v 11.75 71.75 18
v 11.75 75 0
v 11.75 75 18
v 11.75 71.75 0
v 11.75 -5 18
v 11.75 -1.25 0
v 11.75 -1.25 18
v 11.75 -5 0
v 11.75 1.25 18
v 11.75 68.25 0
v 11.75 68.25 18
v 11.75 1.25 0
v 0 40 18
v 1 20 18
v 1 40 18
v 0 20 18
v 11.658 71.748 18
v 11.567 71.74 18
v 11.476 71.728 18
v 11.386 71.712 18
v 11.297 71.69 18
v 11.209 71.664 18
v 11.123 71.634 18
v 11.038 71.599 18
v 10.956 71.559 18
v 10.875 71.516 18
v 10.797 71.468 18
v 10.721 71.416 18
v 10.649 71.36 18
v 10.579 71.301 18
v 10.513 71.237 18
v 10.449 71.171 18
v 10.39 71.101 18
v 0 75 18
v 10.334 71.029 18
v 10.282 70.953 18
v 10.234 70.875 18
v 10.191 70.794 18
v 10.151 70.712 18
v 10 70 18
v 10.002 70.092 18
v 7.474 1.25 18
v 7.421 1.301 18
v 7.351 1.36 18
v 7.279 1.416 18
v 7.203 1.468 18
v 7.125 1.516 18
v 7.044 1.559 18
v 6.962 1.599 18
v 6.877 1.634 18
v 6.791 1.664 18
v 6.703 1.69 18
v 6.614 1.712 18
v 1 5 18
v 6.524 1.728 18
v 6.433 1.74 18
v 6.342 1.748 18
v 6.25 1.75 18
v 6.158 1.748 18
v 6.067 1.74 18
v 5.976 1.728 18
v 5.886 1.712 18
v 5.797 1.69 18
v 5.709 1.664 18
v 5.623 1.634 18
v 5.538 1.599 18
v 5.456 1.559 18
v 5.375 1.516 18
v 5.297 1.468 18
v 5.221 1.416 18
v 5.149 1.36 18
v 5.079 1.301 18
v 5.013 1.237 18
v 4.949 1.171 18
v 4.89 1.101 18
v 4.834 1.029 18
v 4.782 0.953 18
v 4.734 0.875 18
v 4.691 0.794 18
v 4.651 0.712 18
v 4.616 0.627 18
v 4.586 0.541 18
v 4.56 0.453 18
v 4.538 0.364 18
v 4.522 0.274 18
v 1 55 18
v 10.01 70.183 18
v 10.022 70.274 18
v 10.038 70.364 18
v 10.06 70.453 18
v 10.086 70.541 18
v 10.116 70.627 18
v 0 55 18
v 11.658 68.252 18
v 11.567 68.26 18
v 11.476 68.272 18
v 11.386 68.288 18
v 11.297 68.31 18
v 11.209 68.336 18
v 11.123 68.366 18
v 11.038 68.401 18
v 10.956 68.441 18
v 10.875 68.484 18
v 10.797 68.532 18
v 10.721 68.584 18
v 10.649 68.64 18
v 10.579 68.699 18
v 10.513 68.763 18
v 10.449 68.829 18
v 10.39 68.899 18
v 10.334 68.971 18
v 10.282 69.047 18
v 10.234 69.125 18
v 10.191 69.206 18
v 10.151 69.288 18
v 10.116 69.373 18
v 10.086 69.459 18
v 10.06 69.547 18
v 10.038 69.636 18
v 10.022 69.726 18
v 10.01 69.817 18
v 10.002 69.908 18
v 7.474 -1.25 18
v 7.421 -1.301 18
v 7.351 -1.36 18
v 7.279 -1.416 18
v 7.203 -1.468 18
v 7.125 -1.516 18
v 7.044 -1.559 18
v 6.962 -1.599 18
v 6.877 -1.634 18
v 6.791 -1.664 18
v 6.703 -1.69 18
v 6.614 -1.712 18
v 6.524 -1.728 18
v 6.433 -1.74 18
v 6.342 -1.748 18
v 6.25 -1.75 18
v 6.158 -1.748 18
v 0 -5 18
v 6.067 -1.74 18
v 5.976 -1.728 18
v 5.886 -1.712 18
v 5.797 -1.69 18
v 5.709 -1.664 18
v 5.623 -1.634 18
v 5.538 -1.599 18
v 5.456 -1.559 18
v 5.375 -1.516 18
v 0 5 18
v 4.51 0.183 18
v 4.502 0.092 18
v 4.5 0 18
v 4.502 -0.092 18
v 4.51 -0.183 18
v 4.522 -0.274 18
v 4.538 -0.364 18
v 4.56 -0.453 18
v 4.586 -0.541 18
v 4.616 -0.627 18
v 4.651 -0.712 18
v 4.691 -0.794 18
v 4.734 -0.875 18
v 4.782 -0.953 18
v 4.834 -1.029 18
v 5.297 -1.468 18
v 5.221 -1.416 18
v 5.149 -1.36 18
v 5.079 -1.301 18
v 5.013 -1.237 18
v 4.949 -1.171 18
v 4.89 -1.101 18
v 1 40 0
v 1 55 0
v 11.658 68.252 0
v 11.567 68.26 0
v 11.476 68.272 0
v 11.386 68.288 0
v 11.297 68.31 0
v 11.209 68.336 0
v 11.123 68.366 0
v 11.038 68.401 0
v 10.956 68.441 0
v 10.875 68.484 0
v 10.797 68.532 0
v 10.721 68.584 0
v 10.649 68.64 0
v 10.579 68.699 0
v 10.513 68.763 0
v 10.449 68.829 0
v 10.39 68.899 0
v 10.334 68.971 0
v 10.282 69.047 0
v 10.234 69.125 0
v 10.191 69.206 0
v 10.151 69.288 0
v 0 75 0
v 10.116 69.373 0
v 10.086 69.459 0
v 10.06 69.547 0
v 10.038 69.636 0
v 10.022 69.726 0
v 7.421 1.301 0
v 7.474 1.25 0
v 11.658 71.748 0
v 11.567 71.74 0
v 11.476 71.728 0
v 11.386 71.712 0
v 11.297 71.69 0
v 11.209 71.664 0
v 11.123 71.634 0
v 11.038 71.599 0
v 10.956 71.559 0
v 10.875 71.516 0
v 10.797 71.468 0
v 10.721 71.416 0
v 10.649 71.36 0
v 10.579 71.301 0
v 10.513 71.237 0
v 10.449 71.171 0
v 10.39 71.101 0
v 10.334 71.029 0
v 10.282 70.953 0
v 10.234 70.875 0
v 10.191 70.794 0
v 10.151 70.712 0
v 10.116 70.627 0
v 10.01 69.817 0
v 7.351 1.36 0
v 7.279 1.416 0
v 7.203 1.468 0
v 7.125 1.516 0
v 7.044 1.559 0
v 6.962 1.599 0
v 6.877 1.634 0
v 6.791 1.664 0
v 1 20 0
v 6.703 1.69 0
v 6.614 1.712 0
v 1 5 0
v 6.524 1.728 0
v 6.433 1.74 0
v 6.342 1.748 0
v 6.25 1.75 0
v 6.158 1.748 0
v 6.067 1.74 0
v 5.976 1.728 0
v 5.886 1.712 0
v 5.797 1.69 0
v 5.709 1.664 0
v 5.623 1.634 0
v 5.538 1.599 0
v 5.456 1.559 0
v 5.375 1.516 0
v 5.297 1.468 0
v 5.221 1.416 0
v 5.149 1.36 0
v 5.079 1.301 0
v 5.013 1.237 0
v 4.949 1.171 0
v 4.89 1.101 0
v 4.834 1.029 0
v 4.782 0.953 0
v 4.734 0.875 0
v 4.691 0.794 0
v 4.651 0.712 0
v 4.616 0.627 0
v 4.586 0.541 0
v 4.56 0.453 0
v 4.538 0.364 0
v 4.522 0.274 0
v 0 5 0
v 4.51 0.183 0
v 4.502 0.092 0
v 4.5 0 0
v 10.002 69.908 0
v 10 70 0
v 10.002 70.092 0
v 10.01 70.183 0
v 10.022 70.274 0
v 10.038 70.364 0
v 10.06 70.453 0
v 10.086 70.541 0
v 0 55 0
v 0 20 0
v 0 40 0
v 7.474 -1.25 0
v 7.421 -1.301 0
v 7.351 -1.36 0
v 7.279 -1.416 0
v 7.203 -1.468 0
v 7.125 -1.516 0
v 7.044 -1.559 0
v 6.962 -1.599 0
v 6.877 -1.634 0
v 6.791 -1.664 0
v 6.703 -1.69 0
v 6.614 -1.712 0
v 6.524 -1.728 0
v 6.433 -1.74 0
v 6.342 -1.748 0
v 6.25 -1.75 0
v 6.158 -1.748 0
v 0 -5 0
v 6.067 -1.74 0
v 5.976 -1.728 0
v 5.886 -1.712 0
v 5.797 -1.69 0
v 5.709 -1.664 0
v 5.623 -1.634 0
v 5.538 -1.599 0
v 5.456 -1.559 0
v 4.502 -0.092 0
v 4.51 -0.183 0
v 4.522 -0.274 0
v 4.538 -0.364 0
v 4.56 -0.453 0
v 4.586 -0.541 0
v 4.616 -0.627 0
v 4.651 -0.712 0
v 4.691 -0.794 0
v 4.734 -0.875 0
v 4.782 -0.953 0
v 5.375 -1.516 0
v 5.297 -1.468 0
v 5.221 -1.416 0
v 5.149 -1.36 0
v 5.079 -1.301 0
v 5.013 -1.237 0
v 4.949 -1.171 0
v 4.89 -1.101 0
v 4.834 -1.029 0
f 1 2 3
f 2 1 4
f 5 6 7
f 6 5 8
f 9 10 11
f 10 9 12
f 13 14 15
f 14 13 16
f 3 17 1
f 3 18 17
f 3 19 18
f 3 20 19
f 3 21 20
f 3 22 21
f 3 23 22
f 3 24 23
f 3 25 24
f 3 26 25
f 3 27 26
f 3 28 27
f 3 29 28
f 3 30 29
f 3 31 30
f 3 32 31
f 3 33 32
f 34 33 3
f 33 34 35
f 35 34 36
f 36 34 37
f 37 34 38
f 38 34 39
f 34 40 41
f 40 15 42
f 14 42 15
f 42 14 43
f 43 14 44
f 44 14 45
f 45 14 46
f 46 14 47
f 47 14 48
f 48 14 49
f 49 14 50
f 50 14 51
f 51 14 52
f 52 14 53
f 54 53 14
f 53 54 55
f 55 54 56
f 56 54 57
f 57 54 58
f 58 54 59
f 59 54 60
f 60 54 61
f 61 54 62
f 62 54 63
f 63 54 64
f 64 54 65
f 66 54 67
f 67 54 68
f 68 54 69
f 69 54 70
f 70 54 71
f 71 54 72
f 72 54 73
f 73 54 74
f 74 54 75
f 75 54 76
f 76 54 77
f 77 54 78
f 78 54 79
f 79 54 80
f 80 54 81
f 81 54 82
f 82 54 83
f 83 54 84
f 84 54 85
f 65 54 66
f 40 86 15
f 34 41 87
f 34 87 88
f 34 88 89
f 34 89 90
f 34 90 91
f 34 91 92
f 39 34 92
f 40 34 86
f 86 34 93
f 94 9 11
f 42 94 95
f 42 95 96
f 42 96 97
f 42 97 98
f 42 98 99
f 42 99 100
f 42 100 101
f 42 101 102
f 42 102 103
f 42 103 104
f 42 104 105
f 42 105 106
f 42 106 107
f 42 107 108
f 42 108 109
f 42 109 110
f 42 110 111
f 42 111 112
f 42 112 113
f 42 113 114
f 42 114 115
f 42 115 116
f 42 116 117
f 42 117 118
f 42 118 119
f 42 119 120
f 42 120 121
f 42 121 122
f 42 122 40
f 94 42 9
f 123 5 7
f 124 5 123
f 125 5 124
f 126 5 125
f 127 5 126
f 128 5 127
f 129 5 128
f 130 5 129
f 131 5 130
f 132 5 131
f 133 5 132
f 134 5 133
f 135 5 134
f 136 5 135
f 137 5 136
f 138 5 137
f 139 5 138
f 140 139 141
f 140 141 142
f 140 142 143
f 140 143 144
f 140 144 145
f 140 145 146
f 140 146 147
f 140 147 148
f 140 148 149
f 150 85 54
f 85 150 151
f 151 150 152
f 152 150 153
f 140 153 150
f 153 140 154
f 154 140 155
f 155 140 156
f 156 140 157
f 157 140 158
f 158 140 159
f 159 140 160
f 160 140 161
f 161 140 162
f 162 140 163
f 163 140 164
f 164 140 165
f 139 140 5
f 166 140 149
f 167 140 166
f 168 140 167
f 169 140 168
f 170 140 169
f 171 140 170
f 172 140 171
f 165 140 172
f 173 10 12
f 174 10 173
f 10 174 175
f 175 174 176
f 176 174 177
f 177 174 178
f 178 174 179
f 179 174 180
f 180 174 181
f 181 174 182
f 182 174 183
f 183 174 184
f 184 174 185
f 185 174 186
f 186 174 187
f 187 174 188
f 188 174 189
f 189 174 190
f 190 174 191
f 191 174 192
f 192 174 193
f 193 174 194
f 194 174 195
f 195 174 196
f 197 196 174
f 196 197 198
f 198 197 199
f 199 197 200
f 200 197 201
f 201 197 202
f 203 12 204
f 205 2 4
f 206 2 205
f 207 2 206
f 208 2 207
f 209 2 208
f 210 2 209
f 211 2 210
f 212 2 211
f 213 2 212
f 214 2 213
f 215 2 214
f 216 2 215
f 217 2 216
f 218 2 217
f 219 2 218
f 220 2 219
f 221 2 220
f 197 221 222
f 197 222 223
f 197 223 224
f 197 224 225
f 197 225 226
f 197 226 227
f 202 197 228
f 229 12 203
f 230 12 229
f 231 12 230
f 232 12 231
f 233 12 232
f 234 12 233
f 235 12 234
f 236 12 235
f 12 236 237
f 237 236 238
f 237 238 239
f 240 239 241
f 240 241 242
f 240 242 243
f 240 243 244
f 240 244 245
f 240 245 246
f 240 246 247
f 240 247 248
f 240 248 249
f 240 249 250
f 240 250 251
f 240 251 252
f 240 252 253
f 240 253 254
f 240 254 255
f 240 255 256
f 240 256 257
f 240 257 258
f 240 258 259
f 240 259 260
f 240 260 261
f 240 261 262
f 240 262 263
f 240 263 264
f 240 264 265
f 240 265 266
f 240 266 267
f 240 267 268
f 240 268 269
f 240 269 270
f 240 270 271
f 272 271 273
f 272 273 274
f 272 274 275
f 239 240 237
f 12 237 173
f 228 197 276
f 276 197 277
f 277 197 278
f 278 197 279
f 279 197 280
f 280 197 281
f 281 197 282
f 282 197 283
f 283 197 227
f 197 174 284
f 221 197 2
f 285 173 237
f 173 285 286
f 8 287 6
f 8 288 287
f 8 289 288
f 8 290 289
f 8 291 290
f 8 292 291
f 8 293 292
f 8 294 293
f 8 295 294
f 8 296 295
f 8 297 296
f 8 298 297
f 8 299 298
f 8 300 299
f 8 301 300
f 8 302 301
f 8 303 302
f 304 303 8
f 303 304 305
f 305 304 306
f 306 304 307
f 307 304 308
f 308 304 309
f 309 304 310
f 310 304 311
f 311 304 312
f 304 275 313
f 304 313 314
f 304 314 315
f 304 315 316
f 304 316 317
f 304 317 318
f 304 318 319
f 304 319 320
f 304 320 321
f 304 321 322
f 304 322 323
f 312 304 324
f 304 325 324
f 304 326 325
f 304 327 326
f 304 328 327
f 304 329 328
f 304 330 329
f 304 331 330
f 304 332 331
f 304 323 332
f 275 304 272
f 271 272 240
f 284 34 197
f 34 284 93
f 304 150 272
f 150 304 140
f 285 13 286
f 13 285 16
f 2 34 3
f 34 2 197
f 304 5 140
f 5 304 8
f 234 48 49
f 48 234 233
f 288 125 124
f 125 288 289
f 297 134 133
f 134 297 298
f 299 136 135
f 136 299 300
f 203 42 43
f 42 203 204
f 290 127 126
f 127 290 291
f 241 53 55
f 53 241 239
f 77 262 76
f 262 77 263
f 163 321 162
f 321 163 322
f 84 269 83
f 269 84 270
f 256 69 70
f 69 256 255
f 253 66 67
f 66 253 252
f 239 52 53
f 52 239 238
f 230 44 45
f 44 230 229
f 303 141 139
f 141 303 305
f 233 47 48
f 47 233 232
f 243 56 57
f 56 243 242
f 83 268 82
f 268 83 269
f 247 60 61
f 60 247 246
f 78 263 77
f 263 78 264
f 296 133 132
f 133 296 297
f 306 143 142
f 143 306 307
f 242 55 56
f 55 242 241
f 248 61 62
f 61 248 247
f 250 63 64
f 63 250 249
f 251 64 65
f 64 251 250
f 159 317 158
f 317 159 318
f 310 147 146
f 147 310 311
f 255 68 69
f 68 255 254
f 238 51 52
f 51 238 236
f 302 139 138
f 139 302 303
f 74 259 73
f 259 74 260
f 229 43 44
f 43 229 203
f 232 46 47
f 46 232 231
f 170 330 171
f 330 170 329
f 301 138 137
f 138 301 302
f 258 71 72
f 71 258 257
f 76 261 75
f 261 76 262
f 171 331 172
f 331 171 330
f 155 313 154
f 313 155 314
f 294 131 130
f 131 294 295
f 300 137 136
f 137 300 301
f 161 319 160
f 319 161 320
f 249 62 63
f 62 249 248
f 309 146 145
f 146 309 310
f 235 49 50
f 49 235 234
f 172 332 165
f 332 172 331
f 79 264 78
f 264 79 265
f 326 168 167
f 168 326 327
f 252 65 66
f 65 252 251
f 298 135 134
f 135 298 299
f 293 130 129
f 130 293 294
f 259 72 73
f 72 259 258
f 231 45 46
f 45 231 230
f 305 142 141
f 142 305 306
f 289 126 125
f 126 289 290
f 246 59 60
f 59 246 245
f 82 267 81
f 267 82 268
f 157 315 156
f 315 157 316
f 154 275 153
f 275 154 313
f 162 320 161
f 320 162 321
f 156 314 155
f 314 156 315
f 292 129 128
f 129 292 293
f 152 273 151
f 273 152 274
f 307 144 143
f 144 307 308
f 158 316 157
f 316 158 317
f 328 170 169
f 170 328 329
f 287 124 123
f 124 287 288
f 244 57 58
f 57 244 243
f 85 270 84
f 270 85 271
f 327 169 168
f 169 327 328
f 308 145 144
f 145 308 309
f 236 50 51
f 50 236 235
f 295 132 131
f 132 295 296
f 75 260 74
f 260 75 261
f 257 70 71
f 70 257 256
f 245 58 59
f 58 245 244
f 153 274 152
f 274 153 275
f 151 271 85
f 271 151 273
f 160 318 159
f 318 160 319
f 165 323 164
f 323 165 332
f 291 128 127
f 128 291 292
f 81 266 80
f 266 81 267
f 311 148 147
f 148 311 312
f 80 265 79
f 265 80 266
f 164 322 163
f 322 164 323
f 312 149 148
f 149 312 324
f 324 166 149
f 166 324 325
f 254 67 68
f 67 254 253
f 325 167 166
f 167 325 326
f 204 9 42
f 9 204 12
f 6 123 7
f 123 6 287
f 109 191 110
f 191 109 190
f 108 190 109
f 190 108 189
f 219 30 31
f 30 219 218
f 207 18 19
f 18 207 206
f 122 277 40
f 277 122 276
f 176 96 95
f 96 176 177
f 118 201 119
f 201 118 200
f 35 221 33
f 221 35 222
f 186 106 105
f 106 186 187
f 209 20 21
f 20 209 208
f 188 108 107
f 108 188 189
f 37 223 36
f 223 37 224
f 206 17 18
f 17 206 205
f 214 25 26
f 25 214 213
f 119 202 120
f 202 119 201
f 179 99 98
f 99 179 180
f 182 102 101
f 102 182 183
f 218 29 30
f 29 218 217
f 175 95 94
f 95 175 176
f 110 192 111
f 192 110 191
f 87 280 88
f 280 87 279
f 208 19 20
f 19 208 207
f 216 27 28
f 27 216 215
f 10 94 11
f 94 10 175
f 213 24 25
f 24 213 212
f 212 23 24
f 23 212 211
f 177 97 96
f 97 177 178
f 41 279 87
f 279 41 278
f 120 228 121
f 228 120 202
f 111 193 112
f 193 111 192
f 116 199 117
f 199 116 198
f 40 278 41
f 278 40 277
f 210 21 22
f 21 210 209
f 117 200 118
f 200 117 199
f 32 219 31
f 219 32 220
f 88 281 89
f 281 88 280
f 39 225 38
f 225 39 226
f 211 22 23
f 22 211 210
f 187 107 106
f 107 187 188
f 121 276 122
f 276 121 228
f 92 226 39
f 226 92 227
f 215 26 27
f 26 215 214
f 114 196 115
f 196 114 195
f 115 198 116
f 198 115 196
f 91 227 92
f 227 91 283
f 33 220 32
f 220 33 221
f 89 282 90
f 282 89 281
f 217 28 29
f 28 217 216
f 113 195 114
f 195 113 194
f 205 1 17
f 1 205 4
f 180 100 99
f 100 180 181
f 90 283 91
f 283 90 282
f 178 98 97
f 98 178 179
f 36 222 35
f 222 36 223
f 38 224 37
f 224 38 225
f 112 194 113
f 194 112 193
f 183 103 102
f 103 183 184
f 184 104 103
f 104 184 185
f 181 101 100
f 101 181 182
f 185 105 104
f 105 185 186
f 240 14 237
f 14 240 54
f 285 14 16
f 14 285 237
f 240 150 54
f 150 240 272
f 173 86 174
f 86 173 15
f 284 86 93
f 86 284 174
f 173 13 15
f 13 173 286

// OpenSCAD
inner_diameter = 46;
fins = 3;
fin_thickness = 2;
fin_height = 3;

bar_width = 18;
bar_height_low = 4.5;
bar_height_high = 10;
bar_length = 70;
bar_cut_out = 1;
bar_hole = 3.5;
bar_slot = 2.5;

$fn=120;

module fin() {
  union() {
    difference() {
      cylinder(
        d1=(inner_diameter - 2 * fin_height),
        d2=inner_diameter, h=fin_height
      );
      translate([0, 0, fin_thickness]) {
        cylinder(
          d1=(inner_diameter - 2 * fin_height),
          d2=inner_diameter, h=fin_height
        );
      }
    }
    cylinder(d=(inner_diameter - 2 * fin_height), h=fin_height + 1);
  }
}

module seal() {
  difference() {
    union() {
      for (i = [0:fins]) {
        translate([0, 0, i * fin_height]) {
          fin();
        }
      }

      // top
      translate([0, 0, fin_height * (fins + 1)]) {
        cylinder(
          d1=inner_diameter - 2 * fin_height,
          d2=inner_diameter + fin_height + 1, h=1.5 * fin_height
        );
      }

      translate([0, 0, fin_height * (fins + 2.5)]) {
        cylinder(d=inner_diameter + fin_height + 1, h=fin_height * 2);
      }
    }

    // hole
    translate([0, 0, fin_thickness]) {
      cylinder(
        d=inner_diameter - 3 * fin_height,
        h=fins * fin_height + fin_height * 4.5 - fin_thickness
      );
    }
  }
}

module bar() {
  difference() {
    translate([0, -5, 0]) {
      cube([bar_height_high + bar_hole / 2, 10 + bar_length, bar_width]);
    }
    translate([bar_height_low + bar_hole / 2, 0, 0]) {
      cylinder(d=bar_hole, h=bar_width);
    }
    translate([bar_height_low + bar_hole / 2, bar_slot / -2, 0]) {
      cube([bar_height_high - bar_height_low, bar_slot, bar_width]);
    }
    translate([bar_height_high + bar_hole / 2, bar_length, 0]) {
      cylinder(d=bar_hole, h=bar_width);
    }
    translate([0, 5, 0]) {
      cube([bar_cut_out, 15, bar_width]);
    }
    translate([0, bar_length - 30, 0]) {
         cube([bar_cut_out, 15, bar_width]);
    }
  }
}

bar();

// seal();
